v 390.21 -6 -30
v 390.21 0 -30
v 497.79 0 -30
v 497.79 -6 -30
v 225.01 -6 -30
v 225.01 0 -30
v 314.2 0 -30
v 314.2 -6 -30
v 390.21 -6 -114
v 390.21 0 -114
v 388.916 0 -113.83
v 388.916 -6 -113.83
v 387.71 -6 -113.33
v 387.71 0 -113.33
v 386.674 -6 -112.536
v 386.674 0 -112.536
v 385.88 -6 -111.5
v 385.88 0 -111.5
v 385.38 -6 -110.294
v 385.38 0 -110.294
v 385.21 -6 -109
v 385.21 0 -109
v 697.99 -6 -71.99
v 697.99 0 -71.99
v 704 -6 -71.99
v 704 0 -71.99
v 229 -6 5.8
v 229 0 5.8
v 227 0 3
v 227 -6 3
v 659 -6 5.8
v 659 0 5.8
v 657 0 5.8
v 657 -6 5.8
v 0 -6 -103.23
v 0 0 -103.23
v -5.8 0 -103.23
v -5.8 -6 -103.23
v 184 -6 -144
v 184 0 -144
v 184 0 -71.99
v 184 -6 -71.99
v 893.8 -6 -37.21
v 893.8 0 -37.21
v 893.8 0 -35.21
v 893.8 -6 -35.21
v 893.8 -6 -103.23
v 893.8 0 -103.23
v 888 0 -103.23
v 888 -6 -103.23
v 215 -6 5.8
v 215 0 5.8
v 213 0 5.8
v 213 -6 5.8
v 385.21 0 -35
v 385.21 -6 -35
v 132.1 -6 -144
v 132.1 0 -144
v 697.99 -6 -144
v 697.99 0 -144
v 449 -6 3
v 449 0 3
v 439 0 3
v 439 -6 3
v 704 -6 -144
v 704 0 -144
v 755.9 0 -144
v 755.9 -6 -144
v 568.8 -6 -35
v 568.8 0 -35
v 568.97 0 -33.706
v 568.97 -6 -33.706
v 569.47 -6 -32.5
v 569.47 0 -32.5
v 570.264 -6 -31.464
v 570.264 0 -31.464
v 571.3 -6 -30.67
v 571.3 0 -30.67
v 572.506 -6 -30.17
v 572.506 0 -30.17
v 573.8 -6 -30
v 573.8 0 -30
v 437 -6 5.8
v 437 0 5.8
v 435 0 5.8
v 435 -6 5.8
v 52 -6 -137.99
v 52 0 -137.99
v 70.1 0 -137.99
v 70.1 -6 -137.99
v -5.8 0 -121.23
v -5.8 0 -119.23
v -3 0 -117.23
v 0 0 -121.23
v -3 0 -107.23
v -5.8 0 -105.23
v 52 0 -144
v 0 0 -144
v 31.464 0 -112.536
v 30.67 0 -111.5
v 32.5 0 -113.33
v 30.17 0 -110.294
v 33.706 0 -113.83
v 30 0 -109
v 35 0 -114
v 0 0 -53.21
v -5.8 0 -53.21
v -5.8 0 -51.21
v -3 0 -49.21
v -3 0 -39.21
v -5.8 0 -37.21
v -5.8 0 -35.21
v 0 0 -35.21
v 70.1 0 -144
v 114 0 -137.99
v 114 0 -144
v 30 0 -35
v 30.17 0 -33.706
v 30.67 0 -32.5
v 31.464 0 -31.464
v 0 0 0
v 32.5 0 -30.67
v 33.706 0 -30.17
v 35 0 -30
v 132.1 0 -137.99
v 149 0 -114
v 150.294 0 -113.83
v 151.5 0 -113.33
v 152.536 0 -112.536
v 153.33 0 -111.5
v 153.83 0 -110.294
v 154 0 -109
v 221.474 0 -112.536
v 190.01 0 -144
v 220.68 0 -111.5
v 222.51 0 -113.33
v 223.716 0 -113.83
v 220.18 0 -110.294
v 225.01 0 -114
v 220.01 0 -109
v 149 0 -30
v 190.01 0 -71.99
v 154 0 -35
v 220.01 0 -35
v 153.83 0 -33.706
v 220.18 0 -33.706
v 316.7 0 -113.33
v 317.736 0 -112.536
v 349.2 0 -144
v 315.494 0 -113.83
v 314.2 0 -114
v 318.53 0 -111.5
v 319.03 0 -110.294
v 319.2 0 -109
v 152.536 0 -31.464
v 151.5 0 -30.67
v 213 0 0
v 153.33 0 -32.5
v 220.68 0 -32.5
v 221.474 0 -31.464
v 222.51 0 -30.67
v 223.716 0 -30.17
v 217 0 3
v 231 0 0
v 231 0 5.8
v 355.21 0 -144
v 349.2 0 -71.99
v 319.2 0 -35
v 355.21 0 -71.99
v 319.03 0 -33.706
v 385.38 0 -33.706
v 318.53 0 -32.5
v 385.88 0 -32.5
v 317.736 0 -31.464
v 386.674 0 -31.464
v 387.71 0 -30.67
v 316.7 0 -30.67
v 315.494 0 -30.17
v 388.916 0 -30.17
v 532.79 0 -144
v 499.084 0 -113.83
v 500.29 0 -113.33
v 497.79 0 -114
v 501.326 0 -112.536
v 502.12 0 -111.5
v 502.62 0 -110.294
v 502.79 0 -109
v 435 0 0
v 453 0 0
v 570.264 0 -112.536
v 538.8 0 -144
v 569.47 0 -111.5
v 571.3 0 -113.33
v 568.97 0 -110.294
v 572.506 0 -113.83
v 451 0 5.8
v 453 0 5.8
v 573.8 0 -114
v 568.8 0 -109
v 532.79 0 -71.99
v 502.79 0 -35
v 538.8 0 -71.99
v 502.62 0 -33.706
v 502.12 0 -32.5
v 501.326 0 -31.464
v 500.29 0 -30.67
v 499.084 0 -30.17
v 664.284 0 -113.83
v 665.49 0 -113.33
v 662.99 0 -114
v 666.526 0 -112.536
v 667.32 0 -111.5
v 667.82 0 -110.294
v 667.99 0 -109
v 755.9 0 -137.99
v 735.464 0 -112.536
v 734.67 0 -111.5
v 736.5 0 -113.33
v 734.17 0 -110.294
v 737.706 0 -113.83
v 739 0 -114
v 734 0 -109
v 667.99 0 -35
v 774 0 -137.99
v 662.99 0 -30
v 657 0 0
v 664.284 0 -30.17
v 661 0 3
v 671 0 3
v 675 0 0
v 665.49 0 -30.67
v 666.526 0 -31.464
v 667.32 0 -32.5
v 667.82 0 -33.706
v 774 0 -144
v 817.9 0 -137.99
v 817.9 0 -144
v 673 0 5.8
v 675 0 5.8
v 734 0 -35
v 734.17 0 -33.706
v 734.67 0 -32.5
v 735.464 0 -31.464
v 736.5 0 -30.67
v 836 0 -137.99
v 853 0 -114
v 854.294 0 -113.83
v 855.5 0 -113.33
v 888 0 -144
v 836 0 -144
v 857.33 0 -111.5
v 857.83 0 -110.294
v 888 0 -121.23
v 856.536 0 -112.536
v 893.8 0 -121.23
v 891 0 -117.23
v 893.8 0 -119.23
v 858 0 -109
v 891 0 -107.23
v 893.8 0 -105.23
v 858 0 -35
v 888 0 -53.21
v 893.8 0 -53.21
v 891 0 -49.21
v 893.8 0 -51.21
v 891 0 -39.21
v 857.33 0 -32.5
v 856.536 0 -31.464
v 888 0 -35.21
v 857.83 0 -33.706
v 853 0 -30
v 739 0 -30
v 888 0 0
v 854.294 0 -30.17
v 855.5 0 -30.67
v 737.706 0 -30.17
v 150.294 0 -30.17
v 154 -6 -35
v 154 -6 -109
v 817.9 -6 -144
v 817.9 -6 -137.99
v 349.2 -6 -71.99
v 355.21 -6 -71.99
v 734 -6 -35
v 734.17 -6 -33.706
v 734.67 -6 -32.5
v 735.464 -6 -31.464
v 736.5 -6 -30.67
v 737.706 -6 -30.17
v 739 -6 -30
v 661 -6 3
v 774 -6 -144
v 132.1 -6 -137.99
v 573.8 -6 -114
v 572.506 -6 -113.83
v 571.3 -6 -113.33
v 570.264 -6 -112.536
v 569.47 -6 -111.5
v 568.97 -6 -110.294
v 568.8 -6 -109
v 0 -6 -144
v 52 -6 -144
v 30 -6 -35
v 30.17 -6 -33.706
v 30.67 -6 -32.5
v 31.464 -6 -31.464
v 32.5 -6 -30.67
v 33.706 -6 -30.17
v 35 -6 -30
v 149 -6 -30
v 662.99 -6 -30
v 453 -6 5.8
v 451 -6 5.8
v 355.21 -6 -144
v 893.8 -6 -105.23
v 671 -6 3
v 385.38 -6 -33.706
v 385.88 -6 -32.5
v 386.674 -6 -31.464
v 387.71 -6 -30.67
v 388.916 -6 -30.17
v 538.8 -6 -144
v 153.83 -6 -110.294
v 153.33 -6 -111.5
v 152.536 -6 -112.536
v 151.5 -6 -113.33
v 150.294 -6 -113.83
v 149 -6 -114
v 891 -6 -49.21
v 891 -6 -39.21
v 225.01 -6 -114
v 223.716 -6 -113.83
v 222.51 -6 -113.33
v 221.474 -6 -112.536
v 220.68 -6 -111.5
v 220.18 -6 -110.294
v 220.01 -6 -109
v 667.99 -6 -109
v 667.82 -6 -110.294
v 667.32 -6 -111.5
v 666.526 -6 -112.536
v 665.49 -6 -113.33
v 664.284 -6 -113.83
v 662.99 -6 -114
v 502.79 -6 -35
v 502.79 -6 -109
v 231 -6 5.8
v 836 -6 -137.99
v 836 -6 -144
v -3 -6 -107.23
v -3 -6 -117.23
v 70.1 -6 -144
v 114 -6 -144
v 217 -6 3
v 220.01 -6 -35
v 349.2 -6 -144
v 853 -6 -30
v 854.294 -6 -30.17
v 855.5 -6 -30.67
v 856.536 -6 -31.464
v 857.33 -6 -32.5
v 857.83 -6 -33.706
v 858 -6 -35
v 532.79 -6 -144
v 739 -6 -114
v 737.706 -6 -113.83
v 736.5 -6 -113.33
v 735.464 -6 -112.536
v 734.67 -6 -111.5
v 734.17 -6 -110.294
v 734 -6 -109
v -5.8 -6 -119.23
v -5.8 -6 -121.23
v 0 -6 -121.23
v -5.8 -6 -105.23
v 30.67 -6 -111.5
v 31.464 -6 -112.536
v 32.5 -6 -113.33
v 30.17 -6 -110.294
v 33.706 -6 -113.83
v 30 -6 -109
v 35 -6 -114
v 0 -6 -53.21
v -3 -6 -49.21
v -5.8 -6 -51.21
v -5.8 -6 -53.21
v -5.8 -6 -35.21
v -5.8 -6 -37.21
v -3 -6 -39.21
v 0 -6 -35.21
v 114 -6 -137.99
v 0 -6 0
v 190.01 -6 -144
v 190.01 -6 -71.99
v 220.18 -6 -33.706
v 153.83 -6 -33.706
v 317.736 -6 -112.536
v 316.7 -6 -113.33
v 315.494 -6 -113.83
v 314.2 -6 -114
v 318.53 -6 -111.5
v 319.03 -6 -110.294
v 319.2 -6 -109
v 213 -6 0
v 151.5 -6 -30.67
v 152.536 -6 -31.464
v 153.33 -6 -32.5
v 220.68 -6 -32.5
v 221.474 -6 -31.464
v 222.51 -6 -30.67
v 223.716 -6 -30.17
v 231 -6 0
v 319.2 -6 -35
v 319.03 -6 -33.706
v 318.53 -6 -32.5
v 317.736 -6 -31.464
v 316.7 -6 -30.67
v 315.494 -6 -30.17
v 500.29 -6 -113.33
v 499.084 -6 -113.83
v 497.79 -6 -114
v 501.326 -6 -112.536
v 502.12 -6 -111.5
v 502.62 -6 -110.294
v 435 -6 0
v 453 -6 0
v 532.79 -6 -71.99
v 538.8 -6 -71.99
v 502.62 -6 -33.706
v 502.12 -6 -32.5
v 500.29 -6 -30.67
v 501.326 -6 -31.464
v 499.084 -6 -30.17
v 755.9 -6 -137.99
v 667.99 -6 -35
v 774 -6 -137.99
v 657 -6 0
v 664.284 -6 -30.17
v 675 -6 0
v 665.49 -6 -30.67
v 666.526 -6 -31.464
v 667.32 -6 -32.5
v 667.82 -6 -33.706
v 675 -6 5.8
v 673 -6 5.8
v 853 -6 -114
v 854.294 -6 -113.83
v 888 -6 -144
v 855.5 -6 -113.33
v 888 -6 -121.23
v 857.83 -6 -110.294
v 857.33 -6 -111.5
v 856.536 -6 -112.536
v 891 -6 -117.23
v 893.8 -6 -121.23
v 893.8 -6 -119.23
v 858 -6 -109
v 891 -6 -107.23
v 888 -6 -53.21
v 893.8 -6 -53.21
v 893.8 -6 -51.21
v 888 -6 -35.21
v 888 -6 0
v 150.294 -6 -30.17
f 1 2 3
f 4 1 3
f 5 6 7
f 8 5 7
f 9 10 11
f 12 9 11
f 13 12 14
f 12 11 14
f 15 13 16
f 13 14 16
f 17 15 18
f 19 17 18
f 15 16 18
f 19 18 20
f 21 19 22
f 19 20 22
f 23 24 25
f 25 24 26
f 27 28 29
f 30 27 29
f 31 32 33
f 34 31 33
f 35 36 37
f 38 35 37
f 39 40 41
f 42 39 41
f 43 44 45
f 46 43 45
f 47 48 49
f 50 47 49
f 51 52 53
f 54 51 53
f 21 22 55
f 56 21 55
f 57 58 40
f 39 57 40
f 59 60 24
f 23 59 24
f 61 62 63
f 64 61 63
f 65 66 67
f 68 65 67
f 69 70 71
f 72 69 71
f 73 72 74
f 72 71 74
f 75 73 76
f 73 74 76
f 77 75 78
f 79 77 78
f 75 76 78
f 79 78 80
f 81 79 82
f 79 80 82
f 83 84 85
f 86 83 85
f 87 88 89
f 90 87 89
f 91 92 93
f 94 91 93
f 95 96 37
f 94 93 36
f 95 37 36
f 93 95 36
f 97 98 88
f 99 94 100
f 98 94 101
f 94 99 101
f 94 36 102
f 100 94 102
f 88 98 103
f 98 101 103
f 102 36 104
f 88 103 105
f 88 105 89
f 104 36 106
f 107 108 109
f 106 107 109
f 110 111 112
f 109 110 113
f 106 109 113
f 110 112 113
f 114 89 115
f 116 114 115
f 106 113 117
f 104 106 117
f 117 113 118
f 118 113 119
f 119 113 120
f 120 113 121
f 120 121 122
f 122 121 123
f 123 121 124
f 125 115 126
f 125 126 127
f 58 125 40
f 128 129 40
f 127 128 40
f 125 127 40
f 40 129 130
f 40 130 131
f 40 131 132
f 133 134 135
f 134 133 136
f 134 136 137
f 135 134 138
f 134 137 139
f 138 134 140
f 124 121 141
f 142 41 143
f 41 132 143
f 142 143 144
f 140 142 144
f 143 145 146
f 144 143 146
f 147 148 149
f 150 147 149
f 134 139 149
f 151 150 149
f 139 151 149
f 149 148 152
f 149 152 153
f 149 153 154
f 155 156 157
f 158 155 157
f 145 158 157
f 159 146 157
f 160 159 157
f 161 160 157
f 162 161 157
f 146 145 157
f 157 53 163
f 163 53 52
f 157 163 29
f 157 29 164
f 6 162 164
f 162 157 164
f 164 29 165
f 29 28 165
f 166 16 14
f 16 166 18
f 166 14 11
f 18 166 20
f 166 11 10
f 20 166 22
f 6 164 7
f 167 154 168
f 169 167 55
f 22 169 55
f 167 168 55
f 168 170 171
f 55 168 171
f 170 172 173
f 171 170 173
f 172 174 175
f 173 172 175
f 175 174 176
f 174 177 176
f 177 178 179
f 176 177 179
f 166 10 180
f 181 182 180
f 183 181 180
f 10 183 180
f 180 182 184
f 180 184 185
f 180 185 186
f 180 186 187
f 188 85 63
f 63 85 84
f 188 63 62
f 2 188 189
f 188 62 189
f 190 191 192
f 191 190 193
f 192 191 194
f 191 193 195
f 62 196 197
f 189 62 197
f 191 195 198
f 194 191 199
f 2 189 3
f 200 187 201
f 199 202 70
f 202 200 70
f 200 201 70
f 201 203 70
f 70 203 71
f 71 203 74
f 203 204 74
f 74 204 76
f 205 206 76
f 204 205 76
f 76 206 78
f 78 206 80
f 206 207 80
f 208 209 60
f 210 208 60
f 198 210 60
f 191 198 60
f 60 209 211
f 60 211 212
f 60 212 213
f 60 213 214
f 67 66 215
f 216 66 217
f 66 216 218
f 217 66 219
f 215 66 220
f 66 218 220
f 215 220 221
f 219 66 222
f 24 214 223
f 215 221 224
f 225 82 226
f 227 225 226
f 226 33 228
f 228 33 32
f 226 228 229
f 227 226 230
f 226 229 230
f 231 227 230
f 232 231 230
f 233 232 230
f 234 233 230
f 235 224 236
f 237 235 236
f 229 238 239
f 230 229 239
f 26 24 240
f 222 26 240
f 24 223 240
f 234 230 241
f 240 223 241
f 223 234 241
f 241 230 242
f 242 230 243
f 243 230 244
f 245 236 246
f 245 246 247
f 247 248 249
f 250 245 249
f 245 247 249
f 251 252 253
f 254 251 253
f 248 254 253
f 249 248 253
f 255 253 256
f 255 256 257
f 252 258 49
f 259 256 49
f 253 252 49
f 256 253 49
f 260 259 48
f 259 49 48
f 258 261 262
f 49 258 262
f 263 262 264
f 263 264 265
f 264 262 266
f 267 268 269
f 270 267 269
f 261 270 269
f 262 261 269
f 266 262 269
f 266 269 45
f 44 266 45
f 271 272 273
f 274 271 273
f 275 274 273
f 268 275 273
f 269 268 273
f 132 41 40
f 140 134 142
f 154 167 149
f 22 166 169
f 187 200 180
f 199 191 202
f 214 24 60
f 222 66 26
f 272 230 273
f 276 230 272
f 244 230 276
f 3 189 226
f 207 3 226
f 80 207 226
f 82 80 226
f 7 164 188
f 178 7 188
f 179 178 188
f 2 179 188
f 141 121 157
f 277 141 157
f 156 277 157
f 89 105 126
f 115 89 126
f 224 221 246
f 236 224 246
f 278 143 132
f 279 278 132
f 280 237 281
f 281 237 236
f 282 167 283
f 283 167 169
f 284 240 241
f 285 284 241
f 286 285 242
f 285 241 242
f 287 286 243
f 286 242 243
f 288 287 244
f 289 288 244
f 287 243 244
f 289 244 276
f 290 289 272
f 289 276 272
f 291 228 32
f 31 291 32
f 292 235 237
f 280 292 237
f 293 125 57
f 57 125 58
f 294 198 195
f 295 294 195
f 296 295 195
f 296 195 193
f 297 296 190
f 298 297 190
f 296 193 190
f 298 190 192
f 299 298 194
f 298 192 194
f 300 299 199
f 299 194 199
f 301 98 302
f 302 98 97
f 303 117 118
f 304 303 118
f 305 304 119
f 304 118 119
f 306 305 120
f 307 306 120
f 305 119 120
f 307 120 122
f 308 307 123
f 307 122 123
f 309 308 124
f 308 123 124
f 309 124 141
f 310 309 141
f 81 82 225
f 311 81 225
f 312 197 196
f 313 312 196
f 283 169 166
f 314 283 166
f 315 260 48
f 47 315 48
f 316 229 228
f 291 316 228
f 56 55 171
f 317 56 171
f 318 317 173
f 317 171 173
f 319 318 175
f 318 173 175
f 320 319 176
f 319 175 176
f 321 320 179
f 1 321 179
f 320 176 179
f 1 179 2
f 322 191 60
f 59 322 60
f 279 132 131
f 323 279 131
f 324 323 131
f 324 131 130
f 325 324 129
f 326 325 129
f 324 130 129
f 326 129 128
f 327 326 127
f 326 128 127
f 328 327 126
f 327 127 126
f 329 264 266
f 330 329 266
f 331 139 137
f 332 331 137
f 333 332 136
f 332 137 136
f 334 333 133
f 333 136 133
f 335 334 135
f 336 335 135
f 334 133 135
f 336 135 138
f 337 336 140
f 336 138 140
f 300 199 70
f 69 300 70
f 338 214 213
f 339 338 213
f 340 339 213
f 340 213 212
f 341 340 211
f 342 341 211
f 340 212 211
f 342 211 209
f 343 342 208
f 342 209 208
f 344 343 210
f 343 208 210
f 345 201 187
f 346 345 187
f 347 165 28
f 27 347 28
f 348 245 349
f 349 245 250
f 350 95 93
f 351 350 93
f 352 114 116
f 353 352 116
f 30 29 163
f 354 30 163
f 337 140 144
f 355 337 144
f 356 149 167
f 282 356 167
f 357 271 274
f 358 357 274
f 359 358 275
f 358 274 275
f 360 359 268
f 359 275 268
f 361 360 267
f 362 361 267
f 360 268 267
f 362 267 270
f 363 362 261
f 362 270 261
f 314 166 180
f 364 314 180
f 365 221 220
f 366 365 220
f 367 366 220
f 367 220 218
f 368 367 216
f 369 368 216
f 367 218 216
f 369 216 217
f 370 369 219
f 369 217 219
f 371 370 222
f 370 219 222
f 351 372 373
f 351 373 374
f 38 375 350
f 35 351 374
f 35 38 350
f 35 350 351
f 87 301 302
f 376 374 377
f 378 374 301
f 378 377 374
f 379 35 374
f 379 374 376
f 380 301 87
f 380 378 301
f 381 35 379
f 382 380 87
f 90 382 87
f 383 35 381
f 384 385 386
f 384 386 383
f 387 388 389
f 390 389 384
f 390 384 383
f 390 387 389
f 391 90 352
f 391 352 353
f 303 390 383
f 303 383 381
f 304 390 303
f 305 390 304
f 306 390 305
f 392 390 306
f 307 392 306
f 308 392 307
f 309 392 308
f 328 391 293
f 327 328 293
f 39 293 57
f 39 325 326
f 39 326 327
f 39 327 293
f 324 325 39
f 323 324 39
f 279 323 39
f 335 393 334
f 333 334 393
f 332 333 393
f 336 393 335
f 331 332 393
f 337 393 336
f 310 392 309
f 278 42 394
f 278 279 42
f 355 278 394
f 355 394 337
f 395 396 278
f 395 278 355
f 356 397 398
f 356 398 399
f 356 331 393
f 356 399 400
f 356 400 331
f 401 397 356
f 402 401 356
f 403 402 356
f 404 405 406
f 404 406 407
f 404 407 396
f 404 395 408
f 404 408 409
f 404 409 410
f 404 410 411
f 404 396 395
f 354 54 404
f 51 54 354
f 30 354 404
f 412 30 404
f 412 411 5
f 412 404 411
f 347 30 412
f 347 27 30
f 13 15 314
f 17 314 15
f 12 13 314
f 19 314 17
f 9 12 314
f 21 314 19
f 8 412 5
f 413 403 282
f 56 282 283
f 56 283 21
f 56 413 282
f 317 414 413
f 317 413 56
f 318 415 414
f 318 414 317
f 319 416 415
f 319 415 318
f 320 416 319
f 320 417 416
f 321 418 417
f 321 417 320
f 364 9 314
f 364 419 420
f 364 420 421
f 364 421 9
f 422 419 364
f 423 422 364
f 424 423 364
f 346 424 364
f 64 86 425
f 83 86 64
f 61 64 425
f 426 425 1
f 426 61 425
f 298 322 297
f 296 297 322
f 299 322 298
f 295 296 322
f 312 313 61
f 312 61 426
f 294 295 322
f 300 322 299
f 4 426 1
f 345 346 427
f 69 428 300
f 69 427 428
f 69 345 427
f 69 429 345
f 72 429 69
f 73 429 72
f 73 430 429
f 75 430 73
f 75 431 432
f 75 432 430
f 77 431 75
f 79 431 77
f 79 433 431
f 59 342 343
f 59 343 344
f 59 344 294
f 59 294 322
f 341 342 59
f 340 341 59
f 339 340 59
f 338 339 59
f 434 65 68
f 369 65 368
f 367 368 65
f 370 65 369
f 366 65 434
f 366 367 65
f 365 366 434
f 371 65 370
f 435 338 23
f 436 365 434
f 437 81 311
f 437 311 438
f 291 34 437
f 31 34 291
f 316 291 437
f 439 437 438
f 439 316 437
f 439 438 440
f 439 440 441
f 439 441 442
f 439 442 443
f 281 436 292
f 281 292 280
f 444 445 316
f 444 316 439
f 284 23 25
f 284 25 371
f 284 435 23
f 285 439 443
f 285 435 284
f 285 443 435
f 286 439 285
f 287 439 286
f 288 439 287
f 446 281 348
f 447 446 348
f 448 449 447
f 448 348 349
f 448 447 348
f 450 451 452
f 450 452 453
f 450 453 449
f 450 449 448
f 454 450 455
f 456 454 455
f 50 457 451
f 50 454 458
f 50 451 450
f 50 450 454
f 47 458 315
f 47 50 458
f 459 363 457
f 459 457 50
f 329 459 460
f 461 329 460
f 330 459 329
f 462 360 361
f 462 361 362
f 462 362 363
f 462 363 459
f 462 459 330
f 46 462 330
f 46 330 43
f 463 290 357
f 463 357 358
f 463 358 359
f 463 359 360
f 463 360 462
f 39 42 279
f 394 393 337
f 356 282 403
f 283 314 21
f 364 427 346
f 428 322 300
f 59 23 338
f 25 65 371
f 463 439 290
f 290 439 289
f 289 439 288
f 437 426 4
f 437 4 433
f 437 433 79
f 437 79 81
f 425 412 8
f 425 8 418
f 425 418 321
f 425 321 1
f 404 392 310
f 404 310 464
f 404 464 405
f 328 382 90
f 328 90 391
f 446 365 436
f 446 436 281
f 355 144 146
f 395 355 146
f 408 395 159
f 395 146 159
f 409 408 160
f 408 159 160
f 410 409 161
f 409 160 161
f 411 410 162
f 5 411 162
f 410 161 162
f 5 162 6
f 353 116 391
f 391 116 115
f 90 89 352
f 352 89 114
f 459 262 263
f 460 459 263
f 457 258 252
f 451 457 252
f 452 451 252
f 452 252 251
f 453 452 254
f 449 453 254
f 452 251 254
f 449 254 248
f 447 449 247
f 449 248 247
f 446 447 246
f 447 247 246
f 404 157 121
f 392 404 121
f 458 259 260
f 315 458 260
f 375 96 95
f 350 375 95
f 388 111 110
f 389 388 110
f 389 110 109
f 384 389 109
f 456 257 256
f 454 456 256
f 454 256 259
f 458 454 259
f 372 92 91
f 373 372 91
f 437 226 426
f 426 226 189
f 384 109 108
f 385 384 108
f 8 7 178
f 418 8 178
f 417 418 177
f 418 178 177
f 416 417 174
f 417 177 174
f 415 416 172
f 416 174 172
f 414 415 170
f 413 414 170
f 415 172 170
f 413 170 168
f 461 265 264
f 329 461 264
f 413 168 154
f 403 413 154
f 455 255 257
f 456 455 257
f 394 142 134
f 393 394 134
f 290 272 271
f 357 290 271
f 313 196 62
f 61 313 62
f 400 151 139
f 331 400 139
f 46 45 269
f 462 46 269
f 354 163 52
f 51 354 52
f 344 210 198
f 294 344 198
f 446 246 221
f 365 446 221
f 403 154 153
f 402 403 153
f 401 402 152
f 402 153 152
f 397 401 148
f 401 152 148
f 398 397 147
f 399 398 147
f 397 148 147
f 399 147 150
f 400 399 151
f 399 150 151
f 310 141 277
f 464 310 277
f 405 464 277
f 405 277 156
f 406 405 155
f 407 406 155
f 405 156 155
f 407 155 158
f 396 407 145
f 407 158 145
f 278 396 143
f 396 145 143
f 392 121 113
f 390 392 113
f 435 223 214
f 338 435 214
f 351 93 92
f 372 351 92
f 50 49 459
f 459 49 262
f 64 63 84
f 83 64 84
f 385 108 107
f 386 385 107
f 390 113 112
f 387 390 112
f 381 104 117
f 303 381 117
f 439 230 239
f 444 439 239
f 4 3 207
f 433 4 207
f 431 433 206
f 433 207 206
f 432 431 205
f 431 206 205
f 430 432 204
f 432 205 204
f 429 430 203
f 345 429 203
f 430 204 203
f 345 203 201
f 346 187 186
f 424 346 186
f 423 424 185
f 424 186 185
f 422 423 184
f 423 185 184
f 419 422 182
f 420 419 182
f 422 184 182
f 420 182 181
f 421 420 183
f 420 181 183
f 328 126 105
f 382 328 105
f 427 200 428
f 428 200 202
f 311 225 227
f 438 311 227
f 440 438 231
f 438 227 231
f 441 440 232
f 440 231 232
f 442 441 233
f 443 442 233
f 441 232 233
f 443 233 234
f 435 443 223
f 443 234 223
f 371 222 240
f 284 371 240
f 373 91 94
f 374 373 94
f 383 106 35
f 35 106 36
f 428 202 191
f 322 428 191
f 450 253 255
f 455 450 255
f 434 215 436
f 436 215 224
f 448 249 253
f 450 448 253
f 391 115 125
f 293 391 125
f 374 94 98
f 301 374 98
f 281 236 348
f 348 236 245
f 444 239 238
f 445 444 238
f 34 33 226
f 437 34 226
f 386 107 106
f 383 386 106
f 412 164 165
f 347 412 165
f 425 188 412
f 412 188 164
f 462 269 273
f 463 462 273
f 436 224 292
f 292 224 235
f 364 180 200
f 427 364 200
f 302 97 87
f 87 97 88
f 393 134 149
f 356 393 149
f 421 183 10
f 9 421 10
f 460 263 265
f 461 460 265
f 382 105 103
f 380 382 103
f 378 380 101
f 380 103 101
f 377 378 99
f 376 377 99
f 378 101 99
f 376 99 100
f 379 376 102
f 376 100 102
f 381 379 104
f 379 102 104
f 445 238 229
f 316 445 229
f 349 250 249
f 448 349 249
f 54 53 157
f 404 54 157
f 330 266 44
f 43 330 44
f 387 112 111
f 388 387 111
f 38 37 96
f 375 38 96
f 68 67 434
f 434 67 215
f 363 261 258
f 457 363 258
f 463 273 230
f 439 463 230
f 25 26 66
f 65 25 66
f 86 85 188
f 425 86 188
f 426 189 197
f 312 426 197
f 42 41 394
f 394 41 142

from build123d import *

# Parameters (mm, degrees)
F1_DEPTH = 6


with BuildPart() as f1:
    # F0 (on Front) → F1 (new body)
    with BuildSketch(Plane.XZ):
        Polygon((0, -121.23), (0, -144), (52, -144), (52, -137.99), (70.1, -137.99), (70.1, -144), (114, -144), (114, -137.99), (132.1, -137.99), (132.1, -144), (184, -144), (184, -71.99), (190.01, -71.99), (190.01, -144), (349.2, -144), (349.2, -71.99), (355.21, -71.99), (355.21, -144), (532.79, -144), (532.79, -71.99), (538.8, -71.99), (538.8, -144), (697.99, -144), (697.99, -71.99), (704, -71.99), (704, -144), (755.9, -144), (755.9, -137.99), (774, -137.99), (774, -144), (817.9, -144), (817.9, -137.99), (836, -137.99), (836, -144), (888, -144), (888, -121.23), (893.8, -121.23), (893.8, -119.23), (891, -117.23), (891, -107.23), (893.8, -105.23), (893.8, -103.23), (888, -103.23), (888, -53.21), (893.8, -53.21), (893.8, -51.21), (891, -49.21), (891, -39.21), (893.8, -37.21), (893.8, -35.21), (888, -35.21), (888, 0), (675, 0), (675, 5.8), (673, 5.8), (671, 3), (661, 3), (659, 5.8), (657, 5.8), (657, 0), (453, 0), (453, 5.8), (451, 5.8), (449, 3), (439, 3), (437, 5.8), (435, 5.8), (435, 0), (231, 0), (231, 5.8), (229, 5.8), (227, 3), (217, 3), (215, 5.8), (213, 5.8), (213, 0), (0, 0), (0, -35.21), (-5.8, -35.21), (-5.8, -37.21), (-3, -39.21), (-3, -49.21), (-5.8, -51.21), (-5.8, -53.21), (0, -53.21), (0, -103.23), (-5.8, -103.23), (-5.8, -105.23), (-3, -107.23), (-3, -117.23), (-5.8, -119.23), (-5.8, -121.23), align=None)
        with BuildLine():
            ThreePointArc((30, -35), (31.464466, -31.464466), (35, -30))
            Line((35, -30), (149, -30))
            ThreePointArc((149, -30), (152.535534, -31.464466), (154, -35))
            Line((154, -35), (154, -109))
            ThreePointArc((154, -109), (152.535534, -112.535534), (149, -114))
            Line((149, -114), (35, -114))
            ThreePointArc((35, -114), (31.464466, -112.535534), (30, -109))
            Line((30, -109), (30, -35))
        make_face(mode=Mode.SUBTRACT)
        with BuildLine():
            Line((220.01, -109), (220.01, -35))
            ThreePointArc((220.01, -35), (221.474466, -31.464466), (225.01, -30))
            Line((225.01, -30), (314.2, -30))
            ThreePointArc((314.2, -30), (317.735534, -31.464466), (319.2, -35))
            Line((319.2, -35), (319.2, -109))
            ThreePointArc((319.2, -109), (317.735534, -112.535534), (314.2, -114))
            Line((314.2, -114), (225.01, -114))
            ThreePointArc((225.01, -114), (221.474466, -112.535534), (220.01, -109))
        make_face(mode=Mode.SUBTRACT)
        with BuildLine():
            Line((385.21, -109), (385.21, -35))
            ThreePointArc((385.21, -35), (386.674466, -31.464466), (390.21, -30))
            Line((390.21, -30), (497.79, -30))
            ThreePointArc((497.79, -30), (501.325534, -31.464466), (502.79, -35))
            Line((502.79, -35), (502.79, -109))
            ThreePointArc((502.79, -109), (501.325534, -112.535534), (497.79, -114))
            Line((497.79, -114), (390.21, -114))
            ThreePointArc((390.21, -114), (386.674466, -112.535534), (385.21, -109))
        make_face(mode=Mode.SUBTRACT)
        with BuildLine():
            Line((568.8, -109), (568.8, -35))
            ThreePointArc((568.8, -35), (570.264466, -31.464466), (573.8, -30))
            Line((573.8, -30), (662.99, -30))
            ThreePointArc((662.99, -30), (666.525534, -31.464466), (667.99, -35))
            Line((667.99, -35), (667.99, -109))
            ThreePointArc((667.99, -109), (666.525534, -112.535534), (662.99, -114))
            Line((662.99, -114), (573.8, -114))
            ThreePointArc((573.8, -114), (570.264466, -112.535534), (568.8, -109))
        make_face(mode=Mode.SUBTRACT)
        with BuildLine():
            Line((734, -109), (734, -35))
            ThreePointArc((734, -35), (735.464466, -31.464466), (739, -30))
            Line((739, -30), (853, -30))
            ThreePointArc((853, -30), (856.535534, -31.464466), (858, -35))
            Line((858, -35), (858, -109))
            ThreePointArc((858, -109), (856.535534, -112.535534), (853, -114))
            Line((853, -114), (739, -114))
            ThreePointArc((739, -114), (735.464466, -112.535534), (734, -109))
        make_face(mode=Mode.SUBTRACT)
    extrude(amount=F1_DEPTH)


solid = f1.part
